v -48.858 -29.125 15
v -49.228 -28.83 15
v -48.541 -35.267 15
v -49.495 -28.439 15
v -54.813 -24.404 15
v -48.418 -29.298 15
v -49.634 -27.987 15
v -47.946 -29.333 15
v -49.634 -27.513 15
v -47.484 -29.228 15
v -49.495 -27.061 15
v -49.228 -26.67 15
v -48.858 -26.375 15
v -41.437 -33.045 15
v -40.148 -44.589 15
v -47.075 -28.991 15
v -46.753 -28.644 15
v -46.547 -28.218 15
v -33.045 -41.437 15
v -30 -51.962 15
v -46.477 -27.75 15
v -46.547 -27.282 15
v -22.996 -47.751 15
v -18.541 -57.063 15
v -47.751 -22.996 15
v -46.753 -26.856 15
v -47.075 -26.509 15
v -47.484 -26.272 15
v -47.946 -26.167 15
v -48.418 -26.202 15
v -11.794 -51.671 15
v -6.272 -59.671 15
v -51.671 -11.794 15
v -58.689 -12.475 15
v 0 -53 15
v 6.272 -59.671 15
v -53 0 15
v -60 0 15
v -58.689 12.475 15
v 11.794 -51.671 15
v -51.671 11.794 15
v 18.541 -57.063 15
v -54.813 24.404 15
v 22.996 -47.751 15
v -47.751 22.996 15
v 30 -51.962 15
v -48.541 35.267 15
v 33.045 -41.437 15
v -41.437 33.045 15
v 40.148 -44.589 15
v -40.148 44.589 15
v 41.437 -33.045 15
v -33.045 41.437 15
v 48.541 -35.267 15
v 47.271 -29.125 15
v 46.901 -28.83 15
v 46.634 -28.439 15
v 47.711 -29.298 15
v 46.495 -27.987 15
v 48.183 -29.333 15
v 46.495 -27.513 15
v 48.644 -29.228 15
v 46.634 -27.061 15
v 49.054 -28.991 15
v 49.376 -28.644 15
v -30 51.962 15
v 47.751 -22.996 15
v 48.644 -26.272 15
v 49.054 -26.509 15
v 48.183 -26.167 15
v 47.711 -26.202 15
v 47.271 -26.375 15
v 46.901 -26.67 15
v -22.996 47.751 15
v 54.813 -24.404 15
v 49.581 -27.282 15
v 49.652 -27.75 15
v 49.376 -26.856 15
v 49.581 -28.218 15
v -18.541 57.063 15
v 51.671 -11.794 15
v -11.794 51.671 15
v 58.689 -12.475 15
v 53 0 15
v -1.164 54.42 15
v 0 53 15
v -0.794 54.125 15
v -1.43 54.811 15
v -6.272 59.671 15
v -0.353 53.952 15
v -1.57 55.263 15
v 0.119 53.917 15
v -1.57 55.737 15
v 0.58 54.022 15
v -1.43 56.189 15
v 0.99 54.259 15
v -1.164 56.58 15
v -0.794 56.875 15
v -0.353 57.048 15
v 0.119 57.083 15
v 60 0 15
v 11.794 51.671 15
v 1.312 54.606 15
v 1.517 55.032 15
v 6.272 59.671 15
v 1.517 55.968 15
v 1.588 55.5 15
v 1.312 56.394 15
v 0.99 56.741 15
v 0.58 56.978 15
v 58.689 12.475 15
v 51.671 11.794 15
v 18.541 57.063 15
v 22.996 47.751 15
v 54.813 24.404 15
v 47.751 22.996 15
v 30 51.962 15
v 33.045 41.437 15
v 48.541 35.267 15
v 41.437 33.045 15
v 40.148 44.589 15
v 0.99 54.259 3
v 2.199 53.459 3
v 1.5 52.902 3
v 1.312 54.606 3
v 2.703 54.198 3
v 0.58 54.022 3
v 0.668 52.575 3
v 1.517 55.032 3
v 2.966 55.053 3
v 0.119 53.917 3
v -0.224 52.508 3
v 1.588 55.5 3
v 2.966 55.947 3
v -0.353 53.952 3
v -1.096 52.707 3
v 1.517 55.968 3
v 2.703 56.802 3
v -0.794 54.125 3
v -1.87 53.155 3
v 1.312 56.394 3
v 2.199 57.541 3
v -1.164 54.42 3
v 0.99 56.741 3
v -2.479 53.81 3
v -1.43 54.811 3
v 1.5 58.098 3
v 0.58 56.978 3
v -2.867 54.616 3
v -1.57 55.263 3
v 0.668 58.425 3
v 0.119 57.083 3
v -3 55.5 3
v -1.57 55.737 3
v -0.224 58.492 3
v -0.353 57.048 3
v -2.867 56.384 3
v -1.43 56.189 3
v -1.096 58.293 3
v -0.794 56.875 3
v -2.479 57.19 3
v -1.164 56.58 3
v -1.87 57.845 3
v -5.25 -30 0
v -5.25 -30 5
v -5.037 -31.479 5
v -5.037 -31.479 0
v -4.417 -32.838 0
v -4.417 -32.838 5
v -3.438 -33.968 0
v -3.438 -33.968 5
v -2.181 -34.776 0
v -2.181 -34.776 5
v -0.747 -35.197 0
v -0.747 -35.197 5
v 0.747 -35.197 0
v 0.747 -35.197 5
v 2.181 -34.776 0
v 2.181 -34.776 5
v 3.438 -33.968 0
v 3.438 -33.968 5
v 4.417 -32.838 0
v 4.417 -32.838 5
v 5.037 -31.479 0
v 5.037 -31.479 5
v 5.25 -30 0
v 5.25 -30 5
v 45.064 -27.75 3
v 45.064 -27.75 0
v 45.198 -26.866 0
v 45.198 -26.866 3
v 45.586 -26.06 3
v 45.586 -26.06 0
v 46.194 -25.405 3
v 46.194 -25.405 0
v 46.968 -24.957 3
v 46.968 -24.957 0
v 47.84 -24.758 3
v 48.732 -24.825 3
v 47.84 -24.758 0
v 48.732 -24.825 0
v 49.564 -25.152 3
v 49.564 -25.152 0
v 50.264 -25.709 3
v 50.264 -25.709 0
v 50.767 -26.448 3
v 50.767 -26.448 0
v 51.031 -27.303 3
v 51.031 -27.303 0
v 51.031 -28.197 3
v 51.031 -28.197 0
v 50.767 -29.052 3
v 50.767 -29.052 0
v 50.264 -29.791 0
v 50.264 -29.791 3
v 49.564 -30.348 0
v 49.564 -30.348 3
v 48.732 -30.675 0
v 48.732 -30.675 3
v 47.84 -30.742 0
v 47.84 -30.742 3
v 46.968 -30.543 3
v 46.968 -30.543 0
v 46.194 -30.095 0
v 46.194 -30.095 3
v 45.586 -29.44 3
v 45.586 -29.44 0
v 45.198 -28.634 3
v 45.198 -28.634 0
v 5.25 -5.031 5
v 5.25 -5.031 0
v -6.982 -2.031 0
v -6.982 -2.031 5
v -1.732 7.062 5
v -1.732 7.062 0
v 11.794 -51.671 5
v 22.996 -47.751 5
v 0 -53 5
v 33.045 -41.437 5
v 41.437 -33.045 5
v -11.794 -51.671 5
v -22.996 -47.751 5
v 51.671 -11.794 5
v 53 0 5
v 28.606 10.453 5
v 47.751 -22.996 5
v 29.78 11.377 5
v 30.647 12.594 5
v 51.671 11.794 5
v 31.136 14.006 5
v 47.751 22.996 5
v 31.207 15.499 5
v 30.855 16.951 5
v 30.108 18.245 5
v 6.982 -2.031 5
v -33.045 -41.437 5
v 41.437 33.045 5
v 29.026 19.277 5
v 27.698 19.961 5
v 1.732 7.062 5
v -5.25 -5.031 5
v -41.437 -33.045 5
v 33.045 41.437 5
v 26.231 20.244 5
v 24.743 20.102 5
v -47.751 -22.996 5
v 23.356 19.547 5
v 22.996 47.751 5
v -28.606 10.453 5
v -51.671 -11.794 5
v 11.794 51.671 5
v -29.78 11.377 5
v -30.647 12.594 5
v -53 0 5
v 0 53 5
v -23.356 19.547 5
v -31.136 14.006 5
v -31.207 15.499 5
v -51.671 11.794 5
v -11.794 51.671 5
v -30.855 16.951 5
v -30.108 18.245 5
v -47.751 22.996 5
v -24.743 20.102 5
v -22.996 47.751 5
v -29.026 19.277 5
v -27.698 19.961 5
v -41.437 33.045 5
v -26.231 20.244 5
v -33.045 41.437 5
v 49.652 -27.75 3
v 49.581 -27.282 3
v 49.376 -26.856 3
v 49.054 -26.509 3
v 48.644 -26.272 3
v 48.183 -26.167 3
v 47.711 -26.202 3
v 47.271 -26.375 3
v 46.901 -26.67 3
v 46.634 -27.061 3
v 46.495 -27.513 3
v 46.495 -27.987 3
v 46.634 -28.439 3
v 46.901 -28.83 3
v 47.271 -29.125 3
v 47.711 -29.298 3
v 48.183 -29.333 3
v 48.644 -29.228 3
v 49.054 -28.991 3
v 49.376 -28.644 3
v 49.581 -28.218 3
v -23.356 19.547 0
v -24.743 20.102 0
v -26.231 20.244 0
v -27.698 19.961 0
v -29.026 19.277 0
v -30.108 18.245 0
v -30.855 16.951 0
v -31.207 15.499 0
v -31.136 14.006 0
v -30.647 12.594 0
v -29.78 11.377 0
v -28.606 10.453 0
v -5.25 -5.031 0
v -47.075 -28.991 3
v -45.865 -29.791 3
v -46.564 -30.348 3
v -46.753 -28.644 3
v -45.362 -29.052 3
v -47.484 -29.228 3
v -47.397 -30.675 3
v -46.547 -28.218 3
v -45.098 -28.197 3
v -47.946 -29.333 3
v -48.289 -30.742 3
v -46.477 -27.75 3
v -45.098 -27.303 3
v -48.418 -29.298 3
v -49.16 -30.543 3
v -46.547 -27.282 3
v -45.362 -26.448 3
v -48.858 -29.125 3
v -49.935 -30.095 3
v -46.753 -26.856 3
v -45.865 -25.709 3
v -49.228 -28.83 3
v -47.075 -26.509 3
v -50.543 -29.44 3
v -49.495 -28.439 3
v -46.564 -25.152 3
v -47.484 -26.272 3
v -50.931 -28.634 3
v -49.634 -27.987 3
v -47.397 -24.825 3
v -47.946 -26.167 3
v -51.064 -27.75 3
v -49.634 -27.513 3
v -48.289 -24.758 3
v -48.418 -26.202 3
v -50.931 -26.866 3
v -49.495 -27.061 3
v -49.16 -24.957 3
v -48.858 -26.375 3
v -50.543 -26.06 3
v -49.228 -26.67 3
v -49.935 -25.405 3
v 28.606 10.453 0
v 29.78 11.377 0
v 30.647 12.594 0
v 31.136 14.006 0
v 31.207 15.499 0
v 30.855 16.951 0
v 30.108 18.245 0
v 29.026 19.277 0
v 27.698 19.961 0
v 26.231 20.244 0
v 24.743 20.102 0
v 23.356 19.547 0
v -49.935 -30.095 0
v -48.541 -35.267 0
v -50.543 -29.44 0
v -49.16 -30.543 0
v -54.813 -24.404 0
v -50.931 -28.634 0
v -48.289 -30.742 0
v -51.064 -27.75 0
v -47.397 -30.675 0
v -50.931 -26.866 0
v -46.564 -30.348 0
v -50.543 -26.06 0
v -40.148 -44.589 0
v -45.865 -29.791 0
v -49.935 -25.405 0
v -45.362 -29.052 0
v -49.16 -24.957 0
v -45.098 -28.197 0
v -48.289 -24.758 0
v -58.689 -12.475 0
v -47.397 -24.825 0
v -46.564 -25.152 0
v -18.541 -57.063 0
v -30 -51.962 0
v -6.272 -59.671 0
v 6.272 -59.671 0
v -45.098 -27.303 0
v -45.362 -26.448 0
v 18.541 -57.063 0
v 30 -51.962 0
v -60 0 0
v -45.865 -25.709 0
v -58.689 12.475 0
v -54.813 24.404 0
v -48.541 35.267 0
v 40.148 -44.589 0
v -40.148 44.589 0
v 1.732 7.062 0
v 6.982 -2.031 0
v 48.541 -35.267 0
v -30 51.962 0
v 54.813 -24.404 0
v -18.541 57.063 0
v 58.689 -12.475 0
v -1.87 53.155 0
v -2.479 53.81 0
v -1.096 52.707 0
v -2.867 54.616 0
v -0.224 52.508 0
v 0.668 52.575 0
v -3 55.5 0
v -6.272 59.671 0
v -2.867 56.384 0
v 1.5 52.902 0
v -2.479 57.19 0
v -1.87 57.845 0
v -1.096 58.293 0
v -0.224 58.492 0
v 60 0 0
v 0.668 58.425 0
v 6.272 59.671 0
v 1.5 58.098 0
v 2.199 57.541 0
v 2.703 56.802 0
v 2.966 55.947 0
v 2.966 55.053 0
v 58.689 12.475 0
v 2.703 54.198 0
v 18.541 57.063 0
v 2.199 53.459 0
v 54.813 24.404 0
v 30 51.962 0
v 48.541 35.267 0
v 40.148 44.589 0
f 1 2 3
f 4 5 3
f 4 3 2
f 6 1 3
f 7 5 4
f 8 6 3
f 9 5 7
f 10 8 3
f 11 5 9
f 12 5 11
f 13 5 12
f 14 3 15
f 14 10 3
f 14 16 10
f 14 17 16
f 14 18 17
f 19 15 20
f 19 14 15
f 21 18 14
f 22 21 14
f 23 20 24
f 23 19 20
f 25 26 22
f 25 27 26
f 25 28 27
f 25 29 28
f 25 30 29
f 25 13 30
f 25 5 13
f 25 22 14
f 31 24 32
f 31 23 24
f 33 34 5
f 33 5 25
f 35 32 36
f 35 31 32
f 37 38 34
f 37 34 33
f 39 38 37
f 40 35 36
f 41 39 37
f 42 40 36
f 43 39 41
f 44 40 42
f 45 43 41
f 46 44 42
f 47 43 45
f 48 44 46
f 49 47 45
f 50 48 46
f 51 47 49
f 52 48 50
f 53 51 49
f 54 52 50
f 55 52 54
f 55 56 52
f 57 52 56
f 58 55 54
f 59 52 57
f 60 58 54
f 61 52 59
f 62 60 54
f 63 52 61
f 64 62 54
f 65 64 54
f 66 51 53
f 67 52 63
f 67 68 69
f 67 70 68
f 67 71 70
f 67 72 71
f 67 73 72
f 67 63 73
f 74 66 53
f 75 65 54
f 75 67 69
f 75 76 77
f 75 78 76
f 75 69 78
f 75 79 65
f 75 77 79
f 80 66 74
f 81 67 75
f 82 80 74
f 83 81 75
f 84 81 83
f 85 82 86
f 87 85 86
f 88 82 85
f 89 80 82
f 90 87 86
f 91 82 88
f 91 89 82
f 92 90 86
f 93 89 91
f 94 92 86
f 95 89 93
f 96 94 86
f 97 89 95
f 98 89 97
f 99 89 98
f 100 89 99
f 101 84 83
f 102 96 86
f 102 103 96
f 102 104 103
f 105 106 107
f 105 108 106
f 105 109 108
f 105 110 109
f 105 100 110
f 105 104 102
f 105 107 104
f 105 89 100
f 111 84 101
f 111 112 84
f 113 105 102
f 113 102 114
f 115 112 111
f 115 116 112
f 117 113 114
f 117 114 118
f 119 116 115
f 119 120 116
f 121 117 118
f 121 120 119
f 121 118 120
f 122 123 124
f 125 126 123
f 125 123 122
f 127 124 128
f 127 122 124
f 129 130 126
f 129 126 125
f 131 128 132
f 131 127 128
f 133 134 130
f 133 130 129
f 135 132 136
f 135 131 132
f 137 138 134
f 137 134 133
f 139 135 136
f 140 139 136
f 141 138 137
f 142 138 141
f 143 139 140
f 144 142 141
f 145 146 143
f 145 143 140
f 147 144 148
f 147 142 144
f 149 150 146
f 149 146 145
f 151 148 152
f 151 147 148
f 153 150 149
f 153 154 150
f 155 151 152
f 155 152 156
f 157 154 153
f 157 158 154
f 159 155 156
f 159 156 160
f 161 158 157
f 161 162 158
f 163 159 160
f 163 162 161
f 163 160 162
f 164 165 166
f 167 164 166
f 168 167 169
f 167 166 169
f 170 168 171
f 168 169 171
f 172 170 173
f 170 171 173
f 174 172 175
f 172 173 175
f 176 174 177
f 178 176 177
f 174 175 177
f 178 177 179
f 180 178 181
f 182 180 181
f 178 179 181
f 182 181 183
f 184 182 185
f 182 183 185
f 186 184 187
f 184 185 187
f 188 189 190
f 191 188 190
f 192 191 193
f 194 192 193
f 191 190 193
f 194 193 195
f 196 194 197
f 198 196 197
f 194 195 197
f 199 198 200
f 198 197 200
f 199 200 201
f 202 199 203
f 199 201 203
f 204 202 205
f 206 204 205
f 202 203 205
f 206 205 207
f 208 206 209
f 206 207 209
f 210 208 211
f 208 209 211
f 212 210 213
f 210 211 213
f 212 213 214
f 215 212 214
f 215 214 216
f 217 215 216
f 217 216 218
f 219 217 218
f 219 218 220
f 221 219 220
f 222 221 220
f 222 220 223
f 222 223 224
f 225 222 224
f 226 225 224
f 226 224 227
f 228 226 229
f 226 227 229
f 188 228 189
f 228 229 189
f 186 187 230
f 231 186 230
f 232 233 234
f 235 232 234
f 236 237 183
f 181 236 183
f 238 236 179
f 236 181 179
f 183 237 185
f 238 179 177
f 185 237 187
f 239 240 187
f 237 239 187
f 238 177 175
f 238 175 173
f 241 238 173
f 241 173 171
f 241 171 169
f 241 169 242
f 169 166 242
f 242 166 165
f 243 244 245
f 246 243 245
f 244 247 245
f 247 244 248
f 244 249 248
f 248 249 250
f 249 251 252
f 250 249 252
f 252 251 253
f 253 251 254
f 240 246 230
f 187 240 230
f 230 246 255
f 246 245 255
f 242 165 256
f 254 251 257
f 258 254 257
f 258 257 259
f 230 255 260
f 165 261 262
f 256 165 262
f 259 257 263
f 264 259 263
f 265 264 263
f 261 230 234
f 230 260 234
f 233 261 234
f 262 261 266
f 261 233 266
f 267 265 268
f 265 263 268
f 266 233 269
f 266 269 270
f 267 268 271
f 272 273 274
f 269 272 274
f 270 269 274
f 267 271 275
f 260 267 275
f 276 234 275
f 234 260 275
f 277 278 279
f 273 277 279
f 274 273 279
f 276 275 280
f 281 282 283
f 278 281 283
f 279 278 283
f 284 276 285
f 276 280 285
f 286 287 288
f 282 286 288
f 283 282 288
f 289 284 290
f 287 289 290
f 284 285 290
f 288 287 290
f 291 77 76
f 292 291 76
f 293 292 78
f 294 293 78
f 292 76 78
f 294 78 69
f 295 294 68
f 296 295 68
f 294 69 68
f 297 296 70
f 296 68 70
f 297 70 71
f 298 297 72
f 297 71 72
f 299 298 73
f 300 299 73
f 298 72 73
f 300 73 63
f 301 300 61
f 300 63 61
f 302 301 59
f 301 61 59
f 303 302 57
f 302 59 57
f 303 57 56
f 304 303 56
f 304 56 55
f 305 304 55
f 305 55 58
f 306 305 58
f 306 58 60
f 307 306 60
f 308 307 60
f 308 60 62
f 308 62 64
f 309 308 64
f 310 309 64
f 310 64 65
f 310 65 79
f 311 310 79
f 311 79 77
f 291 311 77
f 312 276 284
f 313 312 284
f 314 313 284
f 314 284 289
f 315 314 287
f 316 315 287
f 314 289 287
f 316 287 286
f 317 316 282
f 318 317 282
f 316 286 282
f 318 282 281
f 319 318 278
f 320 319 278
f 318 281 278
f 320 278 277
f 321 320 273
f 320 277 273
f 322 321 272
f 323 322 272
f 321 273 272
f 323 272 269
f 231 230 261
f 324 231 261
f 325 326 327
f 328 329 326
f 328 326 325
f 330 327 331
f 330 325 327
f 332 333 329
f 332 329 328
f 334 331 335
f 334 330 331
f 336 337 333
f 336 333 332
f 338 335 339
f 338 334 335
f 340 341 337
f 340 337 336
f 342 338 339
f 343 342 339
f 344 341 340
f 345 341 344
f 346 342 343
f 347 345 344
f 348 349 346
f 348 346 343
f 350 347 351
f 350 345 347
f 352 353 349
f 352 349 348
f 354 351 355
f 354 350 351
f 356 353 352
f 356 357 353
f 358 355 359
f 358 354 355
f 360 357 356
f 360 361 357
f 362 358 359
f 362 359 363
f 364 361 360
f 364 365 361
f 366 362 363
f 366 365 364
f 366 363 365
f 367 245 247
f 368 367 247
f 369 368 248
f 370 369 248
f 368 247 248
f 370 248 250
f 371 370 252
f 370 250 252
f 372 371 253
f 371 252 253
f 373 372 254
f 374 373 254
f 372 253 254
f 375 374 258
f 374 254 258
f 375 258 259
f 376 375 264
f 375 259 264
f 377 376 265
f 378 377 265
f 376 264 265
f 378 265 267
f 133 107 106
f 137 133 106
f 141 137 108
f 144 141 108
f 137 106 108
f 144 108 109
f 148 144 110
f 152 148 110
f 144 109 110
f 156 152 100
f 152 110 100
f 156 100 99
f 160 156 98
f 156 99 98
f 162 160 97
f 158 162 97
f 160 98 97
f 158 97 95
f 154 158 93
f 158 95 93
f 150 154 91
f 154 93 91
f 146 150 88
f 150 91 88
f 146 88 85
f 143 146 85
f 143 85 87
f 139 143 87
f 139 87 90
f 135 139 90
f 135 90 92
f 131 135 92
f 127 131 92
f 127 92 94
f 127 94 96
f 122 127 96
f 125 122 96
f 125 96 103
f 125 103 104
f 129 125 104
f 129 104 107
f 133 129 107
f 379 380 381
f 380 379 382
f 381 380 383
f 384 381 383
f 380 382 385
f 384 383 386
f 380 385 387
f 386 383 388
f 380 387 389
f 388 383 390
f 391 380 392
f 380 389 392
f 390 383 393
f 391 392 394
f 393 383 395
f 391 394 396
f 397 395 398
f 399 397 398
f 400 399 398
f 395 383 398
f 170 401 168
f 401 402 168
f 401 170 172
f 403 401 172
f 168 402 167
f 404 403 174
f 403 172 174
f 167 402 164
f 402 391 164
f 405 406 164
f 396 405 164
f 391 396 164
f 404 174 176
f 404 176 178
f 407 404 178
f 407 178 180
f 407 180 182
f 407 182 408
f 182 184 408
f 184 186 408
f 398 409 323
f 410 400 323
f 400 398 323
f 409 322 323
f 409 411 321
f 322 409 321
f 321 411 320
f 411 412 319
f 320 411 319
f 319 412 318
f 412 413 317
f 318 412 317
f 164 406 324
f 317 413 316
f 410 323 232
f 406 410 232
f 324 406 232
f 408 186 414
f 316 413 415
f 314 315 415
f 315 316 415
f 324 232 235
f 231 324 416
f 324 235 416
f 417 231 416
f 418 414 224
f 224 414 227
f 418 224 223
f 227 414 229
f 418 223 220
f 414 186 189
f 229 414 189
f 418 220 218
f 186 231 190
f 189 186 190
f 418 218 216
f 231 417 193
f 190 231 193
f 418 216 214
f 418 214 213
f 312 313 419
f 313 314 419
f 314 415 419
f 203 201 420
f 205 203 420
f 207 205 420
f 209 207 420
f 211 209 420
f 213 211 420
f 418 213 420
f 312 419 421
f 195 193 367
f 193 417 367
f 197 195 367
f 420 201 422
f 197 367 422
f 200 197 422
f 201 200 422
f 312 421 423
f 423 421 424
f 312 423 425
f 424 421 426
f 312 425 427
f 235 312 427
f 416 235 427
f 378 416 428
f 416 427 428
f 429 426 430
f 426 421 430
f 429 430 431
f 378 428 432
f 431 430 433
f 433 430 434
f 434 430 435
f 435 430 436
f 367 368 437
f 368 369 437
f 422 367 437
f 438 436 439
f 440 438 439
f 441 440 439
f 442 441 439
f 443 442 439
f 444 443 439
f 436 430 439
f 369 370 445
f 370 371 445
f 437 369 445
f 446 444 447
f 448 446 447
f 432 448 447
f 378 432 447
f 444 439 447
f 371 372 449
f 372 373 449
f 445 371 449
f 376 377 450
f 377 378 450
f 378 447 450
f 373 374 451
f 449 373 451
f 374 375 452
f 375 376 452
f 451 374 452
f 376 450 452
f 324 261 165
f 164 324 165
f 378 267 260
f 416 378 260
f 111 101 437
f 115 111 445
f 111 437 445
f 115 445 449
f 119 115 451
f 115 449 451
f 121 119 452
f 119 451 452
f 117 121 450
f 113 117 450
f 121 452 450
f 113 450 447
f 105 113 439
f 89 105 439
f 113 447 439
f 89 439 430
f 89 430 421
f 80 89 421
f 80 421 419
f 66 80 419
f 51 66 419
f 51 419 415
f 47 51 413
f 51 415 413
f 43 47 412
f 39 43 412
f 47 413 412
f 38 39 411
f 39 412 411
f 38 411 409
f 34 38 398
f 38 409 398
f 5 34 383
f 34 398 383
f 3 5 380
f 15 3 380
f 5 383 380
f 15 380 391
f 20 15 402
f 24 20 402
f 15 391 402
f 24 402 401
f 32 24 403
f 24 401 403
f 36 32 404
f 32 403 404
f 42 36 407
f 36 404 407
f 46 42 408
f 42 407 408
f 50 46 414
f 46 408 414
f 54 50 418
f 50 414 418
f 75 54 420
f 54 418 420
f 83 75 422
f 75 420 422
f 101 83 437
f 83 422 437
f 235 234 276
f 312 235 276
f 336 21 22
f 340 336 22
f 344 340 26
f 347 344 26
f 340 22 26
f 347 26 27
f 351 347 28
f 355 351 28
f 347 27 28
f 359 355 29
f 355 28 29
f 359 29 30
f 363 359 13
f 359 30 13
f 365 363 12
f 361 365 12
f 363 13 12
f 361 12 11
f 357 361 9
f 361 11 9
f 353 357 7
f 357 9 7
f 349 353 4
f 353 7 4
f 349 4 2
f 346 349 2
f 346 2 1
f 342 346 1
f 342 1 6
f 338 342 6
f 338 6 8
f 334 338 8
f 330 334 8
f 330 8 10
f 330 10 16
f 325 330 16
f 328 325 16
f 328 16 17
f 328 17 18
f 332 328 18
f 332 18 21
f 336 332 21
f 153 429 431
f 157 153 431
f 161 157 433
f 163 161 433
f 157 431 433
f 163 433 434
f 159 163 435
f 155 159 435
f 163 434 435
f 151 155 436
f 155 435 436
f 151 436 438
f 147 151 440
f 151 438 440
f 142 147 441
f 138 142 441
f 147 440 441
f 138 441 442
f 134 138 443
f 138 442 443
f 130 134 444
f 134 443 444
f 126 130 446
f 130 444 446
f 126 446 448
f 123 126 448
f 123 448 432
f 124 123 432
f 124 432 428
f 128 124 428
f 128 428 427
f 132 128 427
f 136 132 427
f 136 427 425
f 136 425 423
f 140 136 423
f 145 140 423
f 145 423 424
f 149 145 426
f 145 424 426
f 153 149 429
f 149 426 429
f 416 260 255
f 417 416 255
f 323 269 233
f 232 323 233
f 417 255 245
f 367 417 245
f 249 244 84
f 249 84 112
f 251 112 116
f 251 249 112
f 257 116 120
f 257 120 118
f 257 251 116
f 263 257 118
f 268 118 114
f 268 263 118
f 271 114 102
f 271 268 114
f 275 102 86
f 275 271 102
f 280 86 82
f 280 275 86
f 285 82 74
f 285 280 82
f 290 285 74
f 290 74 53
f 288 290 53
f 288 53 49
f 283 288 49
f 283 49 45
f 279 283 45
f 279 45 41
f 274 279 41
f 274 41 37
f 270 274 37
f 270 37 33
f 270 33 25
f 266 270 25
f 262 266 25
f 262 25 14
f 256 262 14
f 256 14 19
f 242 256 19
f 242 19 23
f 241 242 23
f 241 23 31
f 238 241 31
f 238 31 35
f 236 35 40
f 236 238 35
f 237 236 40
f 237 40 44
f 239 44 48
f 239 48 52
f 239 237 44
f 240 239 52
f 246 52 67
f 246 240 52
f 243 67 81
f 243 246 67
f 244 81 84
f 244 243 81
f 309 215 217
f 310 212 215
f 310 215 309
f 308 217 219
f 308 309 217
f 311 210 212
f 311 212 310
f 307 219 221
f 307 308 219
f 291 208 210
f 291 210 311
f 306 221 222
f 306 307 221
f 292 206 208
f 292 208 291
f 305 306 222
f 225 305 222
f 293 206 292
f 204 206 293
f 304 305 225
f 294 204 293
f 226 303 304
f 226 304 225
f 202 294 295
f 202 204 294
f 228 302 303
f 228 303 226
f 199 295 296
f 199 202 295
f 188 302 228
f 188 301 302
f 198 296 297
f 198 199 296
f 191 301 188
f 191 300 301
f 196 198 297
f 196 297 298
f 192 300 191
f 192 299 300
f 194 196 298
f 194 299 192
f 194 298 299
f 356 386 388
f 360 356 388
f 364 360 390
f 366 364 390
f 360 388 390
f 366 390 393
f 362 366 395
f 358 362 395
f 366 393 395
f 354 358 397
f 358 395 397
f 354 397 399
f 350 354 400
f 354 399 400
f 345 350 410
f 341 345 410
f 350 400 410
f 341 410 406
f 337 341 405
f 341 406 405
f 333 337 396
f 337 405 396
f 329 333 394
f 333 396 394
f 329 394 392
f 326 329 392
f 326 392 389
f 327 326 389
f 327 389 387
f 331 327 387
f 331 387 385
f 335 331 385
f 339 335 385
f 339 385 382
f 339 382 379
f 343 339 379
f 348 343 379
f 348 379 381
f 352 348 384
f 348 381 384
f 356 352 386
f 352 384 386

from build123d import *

# Parameters (mm, degrees)
CROQUIS1_R                   = 55
DISCO_DEPTH                  = 5
CORTAR_EXTRUIR1_DEPTH        = 10
SALIENTE_EXTRUIR1_DEPTH      = 10
SALIENTE_EXTRUIR1_DEPTH_BACK = 5
CROQUIS7_R                   = 60
CROQUIS7_R_2                 = 55
CROQUIS7_R_3                 = 53
SALIENTE_EXTRUIR6_DEPTH      = 5
CROQUIS9_R                   = 1.5875
CORTAR_EXTRUIR2_DEPTH        = 87.168439698
CROQUIS10_R                  = 3
CORTAR_EXTRUIR3_DEPTH        = 3


with BuildPart() as part:
    # Croquis1 → Disco (new body)
    with BuildSketch(Plane.XY):
        Circle(CROQUIS1_R)
    extrude(amount=DISCO_DEPTH)

    # Croquis6 → Cortar-Extruir1 (cut)
    with BuildSketch(Plane.XY.offset(5)):
        with BuildLine():
            Line((-5.25, 0), (-5.25, -30))
            ThreePointArc((-5.25, -30), (0, -35.25), (5.25, -30))
            Line((5.25, -30), (5.25, 0))
            ThreePointArc((5.25, 0), (0, 5.25), (-5.25, 0))
        make_face()
        with BuildLine():
            Line((2.625, 4.54663337), (-23.355762114, 19.54663337))
            ThreePointArc((-23.355762114, 19.54663337), (-30.527395483, 17.625), (-28.605762114, 10.45336663))
            Line((-28.605762114, 10.45336663), (-2.625, -4.54663337))
            ThreePointArc((-2.625, -4.54663337), (4.54663337, -2.625), (2.625, 4.54663337))
        make_face()
        with BuildLine():
            Line((2.625, -4.54663337), (28.605762114, 10.45336663))
            ThreePointArc((28.605762114, 10.45336663), (30.527395483, 17.625), (23.355762114, 19.54663337))
            Line((23.355762114, 19.54663337), (-2.625, 4.54663337))
            ThreePointArc((-2.625, 4.54663337), (-4.54663337, -2.625), (2.625, -4.54663337))
        make_face()
    extrude(amount=-CORTAR_EXTRUIR1_DEPTH, mode=Mode.SUBTRACT)

    # Croquis7 → Saliente-Extruir1 (add, two sides: drawn at the far end of the back side and taken through both)
    # profile 1 of 2: a face of its own
    with BuildSketch(Plane.XY.offset(5).offset(-SALIENTE_EXTRUIR1_DEPTH_BACK)):
        Circle(CROQUIS7_R)
        Circle(CROQUIS7_R_2, mode=Mode.SUBTRACT)
    # profile 2 of 2: a face of its own
    with BuildSketch(Plane.XY.offset(5).offset(-SALIENTE_EXTRUIR1_DEPTH_BACK)):
        Circle(CROQUIS7_R_2)
        Circle(CROQUIS7_R_3, mode=Mode.SUBTRACT)
    extrude(amount=SALIENTE_EXTRUIR1_DEPTH + SALIENTE_EXTRUIR1_DEPTH_BACK)

    # Croquis8 → Saliente-Extruir6 (add)
    with BuildSketch(Plane.XY.offset(5)):
        Polygon((-8.714101615, -5.031088913), (0, 10.062177826), (8.714101615, -5.031088913), align=None)
    extrude(amount=-SALIENTE_EXTRUIR6_DEPTH)

    # Croquis9 → Cortar-Extruir2 (cut, through all)
    with BuildSketch(Plane.XY.offset(15)):
        with Locations((0, 55.5)):
            Circle(CROQUIS9_R)
        with Locations((48.06440991, -27.75)):
            Circle(CROQUIS9_R)
        with Locations((-48.06440991, -27.75)):
            Circle(CROQUIS9_R)
    extrude(amount=-CORTAR_EXTRUIR2_DEPTH, mode=Mode.SUBTRACT)

    # Croquis10 → Cortar-Extruir3 (cut)
    with BuildSketch(Plane(origin=(0, 0, 0), x_dir=(-1, 0, 0), z_dir=(0, 0, -1))):
        with Locations((0, 55.5)):
            Circle(CROQUIS10_R)
        with Locations((48.06440991, -27.75)):
            Circle(CROQUIS10_R)
        with Locations((-48.06440991, -27.75)):
            Circle(CROQUIS10_R)
    extrude(amount=-CORTAR_EXTRUIR3_DEPTH, mode=Mode.SUBTRACT)


solid = part.part
